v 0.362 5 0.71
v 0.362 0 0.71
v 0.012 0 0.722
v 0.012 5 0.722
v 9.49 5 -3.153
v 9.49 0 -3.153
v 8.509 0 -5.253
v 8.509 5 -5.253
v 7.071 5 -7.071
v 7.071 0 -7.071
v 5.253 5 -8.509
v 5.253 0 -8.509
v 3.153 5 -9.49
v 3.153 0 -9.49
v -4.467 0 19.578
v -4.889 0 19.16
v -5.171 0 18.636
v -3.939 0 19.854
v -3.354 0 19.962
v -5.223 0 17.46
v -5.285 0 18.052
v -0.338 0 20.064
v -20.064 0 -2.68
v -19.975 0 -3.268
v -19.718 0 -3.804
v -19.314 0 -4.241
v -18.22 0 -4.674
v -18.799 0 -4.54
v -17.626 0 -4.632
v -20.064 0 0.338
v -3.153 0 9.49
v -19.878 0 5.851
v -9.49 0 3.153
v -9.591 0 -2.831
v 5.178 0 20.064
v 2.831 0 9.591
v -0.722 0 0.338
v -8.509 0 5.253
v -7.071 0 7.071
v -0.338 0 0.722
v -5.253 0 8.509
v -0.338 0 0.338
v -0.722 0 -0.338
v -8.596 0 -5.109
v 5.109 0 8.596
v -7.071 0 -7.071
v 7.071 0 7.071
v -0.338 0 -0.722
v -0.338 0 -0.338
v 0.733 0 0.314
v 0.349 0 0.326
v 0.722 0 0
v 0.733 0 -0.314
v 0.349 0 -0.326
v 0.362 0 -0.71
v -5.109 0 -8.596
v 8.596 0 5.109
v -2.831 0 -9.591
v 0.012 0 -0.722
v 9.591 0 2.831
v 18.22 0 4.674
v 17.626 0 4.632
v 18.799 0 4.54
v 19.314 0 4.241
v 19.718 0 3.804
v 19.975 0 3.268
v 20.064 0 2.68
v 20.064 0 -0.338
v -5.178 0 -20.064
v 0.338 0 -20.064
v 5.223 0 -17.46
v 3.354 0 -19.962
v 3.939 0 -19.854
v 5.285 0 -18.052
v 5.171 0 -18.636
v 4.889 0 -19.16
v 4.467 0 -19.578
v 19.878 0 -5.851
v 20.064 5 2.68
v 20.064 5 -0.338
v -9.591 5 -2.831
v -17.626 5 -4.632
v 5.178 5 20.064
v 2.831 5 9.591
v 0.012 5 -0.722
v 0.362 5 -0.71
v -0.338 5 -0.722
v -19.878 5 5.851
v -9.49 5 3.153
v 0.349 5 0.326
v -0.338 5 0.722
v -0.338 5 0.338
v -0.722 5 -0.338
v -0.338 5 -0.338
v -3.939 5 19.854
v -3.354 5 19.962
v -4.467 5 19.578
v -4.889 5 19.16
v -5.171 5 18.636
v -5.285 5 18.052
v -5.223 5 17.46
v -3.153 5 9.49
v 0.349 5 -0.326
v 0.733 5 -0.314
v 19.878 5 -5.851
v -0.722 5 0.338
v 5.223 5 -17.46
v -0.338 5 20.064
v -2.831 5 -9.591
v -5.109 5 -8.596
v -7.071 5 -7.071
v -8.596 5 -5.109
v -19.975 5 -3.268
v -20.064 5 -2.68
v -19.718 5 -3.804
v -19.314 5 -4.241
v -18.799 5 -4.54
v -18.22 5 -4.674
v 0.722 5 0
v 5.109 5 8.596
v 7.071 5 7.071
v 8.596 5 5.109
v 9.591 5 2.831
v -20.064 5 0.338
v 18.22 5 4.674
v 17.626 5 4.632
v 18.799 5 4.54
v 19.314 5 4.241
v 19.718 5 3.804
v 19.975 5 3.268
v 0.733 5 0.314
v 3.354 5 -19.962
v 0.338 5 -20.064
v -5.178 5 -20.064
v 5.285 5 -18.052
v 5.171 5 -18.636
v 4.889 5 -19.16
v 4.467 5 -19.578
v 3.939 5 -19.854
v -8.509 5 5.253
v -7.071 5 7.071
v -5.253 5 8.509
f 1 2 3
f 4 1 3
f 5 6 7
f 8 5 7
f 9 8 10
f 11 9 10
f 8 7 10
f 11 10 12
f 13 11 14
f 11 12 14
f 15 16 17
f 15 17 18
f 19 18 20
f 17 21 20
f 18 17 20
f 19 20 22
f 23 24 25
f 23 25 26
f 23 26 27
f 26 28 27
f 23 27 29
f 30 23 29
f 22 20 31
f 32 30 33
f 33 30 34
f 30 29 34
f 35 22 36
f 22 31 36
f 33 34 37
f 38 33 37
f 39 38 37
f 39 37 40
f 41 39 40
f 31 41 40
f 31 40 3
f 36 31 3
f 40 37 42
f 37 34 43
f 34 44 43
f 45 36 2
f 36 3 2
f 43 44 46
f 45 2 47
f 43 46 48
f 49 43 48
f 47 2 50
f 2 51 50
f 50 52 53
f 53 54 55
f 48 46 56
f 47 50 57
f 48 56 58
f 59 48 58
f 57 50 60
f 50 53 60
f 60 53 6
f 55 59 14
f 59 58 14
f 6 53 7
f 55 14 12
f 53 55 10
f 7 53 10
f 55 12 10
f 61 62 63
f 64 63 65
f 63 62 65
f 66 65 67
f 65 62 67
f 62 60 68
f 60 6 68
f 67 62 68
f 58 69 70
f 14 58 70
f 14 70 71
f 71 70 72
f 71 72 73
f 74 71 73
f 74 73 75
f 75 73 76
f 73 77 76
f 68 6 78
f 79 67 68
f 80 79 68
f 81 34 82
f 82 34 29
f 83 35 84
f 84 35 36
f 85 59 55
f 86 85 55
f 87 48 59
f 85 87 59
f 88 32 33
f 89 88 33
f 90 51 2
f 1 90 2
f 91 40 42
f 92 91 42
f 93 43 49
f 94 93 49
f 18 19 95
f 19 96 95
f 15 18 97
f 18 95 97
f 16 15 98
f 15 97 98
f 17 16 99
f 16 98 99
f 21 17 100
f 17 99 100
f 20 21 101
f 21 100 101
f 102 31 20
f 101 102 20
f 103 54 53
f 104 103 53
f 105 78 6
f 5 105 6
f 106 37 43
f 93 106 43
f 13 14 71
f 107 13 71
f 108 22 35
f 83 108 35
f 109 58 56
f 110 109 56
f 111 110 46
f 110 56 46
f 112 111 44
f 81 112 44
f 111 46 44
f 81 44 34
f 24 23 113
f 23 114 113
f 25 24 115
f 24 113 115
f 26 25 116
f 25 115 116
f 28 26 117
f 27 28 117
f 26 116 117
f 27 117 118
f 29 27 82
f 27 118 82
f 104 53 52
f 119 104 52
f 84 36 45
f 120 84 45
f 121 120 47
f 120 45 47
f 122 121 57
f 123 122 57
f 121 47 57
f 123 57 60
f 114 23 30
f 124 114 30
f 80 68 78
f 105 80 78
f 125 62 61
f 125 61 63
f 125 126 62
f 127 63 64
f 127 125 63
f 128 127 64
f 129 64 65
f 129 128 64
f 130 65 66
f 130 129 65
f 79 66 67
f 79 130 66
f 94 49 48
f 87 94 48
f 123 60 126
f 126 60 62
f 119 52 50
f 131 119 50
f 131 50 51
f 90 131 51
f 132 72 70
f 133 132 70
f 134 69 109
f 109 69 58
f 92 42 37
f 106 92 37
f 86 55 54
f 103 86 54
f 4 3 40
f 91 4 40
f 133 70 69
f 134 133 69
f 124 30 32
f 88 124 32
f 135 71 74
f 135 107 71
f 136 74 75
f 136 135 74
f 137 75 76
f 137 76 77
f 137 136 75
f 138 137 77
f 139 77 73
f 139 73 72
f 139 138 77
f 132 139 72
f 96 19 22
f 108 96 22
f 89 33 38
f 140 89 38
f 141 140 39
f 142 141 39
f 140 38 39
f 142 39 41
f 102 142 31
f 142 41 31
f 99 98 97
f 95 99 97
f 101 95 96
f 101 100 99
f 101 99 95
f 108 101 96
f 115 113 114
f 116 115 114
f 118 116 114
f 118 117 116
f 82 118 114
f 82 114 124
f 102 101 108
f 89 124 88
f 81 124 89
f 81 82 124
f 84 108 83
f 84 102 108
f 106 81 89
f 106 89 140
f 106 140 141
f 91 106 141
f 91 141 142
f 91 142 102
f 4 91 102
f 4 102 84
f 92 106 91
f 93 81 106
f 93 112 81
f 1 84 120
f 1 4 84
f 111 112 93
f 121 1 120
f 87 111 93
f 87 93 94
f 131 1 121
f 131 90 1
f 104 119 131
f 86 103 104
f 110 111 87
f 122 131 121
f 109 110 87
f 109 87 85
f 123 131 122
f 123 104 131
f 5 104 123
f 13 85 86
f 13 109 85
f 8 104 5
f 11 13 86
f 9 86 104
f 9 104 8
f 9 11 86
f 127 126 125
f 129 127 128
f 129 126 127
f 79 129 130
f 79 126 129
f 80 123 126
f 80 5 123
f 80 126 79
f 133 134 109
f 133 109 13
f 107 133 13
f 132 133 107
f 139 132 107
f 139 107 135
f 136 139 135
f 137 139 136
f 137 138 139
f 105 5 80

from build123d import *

# Parameters (mm, degrees)
BOSS_EXTRUDE1_DEPTH = 5
FILLET1_R           = 2


with BuildPart() as part:
    # Sketch1 → Boss-Extrude1 (new body)
    with BuildSketch(Plane(origin=(0, 0, 0), x_dir=(1, 0, 0), z_dir=(0, 1, 0))):
        with BuildLine():
            Line((5.177710586, -20.063712518), (2.831257578, -9.590827937))
            ThreePointArc((2.831257578, -9.590827937), (7.071067812, -7.071067812), (9.590827937, -2.831257578))
            Line((9.590827937, -2.831257578), (20.063712518, -5.177710586))
            Line((20.063712518, -5.177710586), (20.063712518, 0.338076022))
            Line((20.063712518, 0.338076022), (19.877881915, 5.850731362))
            Line((19.877881915, 5.850731362), (9.489996307, 3.152771812))
            ThreePointArc((9.489996307, 3.152771812), (7.071067812, 7.071067812), (3.152771812, 9.489996307))
            Line((3.152771812, 9.489996307), (5.850731362, 19.877881915))
            Line((5.850731362, 19.877881915), (0.338076022, 20.063712518))
            Line((0.338076022, 20.063712518), (-5.177710586, 20.063712518))
            Line((-5.177710586, 20.063712518), (-2.831257578, 9.590827937))
            ThreePointArc((-2.831257578, 9.590827937), (-7.071067812, 7.071067812), (-9.590827937, 2.831257578))
            Line((-9.590827937, 2.831257578), (-20.063712518, 5.177710586))
            Line((-20.063712518, 5.177710586), (-20.063712518, -0.338076022))
            Line((-20.063712518, -0.338076022), (-19.877881915, -5.850731362))
            Line((-19.877881915, -5.850731362), (-9.489996307, -3.152771812))
            ThreePointArc((-9.489996307, -3.152771812), (-7.071067812, -7.071067812), (-3.152771812, -9.489996307))
            Line((-3.152771812, -9.489996307), (-5.850731362, -19.877881915))
            Line((-5.850731362, -19.877881915), (-0.338076022, -20.063712518))
            Line((-0.338076022, -20.063712518), (5.177710586, -20.063712518))
        make_face()
        Polygon((-0.338076022, -0.721880139), (-0.338076022, -0.338076022), (-0.721880139, -0.338076022), (-0.721880139, 0.338076022), (-0.338076022, 0.338076022), (-0.338076022, 0.721880139), (0.012163769, 0.721880139), (0.362204732, 0.710080322), (0.34927411, 0.326494088), (0.732860345, 0.313563466), (0.722290178, 0), (0.732860345, -0.313563466), (0.34927411, -0.326494088), (0.362204732, -0.710080322), (0.012163769, -0.721880139), align=None, mode=Mode.SUBTRACT)
    extrude(amount=BOSS_EXTRUDE1_DEPTH)

    # Fillet1
    fillet1_edges = [part.edges().sort_by_distance(p)[0] for p in [
        (20.063712518, 2.5, 5.177710586),
        (-5.850731362, 2.5, 19.877881915),
        (-20.063712518, 2.5, -5.177710586),
        (5.850731362, 2.5, -19.877881915),
    ]]
    fillet(fillet1_edges, radius=FILLET1_R)


solid = part.part
